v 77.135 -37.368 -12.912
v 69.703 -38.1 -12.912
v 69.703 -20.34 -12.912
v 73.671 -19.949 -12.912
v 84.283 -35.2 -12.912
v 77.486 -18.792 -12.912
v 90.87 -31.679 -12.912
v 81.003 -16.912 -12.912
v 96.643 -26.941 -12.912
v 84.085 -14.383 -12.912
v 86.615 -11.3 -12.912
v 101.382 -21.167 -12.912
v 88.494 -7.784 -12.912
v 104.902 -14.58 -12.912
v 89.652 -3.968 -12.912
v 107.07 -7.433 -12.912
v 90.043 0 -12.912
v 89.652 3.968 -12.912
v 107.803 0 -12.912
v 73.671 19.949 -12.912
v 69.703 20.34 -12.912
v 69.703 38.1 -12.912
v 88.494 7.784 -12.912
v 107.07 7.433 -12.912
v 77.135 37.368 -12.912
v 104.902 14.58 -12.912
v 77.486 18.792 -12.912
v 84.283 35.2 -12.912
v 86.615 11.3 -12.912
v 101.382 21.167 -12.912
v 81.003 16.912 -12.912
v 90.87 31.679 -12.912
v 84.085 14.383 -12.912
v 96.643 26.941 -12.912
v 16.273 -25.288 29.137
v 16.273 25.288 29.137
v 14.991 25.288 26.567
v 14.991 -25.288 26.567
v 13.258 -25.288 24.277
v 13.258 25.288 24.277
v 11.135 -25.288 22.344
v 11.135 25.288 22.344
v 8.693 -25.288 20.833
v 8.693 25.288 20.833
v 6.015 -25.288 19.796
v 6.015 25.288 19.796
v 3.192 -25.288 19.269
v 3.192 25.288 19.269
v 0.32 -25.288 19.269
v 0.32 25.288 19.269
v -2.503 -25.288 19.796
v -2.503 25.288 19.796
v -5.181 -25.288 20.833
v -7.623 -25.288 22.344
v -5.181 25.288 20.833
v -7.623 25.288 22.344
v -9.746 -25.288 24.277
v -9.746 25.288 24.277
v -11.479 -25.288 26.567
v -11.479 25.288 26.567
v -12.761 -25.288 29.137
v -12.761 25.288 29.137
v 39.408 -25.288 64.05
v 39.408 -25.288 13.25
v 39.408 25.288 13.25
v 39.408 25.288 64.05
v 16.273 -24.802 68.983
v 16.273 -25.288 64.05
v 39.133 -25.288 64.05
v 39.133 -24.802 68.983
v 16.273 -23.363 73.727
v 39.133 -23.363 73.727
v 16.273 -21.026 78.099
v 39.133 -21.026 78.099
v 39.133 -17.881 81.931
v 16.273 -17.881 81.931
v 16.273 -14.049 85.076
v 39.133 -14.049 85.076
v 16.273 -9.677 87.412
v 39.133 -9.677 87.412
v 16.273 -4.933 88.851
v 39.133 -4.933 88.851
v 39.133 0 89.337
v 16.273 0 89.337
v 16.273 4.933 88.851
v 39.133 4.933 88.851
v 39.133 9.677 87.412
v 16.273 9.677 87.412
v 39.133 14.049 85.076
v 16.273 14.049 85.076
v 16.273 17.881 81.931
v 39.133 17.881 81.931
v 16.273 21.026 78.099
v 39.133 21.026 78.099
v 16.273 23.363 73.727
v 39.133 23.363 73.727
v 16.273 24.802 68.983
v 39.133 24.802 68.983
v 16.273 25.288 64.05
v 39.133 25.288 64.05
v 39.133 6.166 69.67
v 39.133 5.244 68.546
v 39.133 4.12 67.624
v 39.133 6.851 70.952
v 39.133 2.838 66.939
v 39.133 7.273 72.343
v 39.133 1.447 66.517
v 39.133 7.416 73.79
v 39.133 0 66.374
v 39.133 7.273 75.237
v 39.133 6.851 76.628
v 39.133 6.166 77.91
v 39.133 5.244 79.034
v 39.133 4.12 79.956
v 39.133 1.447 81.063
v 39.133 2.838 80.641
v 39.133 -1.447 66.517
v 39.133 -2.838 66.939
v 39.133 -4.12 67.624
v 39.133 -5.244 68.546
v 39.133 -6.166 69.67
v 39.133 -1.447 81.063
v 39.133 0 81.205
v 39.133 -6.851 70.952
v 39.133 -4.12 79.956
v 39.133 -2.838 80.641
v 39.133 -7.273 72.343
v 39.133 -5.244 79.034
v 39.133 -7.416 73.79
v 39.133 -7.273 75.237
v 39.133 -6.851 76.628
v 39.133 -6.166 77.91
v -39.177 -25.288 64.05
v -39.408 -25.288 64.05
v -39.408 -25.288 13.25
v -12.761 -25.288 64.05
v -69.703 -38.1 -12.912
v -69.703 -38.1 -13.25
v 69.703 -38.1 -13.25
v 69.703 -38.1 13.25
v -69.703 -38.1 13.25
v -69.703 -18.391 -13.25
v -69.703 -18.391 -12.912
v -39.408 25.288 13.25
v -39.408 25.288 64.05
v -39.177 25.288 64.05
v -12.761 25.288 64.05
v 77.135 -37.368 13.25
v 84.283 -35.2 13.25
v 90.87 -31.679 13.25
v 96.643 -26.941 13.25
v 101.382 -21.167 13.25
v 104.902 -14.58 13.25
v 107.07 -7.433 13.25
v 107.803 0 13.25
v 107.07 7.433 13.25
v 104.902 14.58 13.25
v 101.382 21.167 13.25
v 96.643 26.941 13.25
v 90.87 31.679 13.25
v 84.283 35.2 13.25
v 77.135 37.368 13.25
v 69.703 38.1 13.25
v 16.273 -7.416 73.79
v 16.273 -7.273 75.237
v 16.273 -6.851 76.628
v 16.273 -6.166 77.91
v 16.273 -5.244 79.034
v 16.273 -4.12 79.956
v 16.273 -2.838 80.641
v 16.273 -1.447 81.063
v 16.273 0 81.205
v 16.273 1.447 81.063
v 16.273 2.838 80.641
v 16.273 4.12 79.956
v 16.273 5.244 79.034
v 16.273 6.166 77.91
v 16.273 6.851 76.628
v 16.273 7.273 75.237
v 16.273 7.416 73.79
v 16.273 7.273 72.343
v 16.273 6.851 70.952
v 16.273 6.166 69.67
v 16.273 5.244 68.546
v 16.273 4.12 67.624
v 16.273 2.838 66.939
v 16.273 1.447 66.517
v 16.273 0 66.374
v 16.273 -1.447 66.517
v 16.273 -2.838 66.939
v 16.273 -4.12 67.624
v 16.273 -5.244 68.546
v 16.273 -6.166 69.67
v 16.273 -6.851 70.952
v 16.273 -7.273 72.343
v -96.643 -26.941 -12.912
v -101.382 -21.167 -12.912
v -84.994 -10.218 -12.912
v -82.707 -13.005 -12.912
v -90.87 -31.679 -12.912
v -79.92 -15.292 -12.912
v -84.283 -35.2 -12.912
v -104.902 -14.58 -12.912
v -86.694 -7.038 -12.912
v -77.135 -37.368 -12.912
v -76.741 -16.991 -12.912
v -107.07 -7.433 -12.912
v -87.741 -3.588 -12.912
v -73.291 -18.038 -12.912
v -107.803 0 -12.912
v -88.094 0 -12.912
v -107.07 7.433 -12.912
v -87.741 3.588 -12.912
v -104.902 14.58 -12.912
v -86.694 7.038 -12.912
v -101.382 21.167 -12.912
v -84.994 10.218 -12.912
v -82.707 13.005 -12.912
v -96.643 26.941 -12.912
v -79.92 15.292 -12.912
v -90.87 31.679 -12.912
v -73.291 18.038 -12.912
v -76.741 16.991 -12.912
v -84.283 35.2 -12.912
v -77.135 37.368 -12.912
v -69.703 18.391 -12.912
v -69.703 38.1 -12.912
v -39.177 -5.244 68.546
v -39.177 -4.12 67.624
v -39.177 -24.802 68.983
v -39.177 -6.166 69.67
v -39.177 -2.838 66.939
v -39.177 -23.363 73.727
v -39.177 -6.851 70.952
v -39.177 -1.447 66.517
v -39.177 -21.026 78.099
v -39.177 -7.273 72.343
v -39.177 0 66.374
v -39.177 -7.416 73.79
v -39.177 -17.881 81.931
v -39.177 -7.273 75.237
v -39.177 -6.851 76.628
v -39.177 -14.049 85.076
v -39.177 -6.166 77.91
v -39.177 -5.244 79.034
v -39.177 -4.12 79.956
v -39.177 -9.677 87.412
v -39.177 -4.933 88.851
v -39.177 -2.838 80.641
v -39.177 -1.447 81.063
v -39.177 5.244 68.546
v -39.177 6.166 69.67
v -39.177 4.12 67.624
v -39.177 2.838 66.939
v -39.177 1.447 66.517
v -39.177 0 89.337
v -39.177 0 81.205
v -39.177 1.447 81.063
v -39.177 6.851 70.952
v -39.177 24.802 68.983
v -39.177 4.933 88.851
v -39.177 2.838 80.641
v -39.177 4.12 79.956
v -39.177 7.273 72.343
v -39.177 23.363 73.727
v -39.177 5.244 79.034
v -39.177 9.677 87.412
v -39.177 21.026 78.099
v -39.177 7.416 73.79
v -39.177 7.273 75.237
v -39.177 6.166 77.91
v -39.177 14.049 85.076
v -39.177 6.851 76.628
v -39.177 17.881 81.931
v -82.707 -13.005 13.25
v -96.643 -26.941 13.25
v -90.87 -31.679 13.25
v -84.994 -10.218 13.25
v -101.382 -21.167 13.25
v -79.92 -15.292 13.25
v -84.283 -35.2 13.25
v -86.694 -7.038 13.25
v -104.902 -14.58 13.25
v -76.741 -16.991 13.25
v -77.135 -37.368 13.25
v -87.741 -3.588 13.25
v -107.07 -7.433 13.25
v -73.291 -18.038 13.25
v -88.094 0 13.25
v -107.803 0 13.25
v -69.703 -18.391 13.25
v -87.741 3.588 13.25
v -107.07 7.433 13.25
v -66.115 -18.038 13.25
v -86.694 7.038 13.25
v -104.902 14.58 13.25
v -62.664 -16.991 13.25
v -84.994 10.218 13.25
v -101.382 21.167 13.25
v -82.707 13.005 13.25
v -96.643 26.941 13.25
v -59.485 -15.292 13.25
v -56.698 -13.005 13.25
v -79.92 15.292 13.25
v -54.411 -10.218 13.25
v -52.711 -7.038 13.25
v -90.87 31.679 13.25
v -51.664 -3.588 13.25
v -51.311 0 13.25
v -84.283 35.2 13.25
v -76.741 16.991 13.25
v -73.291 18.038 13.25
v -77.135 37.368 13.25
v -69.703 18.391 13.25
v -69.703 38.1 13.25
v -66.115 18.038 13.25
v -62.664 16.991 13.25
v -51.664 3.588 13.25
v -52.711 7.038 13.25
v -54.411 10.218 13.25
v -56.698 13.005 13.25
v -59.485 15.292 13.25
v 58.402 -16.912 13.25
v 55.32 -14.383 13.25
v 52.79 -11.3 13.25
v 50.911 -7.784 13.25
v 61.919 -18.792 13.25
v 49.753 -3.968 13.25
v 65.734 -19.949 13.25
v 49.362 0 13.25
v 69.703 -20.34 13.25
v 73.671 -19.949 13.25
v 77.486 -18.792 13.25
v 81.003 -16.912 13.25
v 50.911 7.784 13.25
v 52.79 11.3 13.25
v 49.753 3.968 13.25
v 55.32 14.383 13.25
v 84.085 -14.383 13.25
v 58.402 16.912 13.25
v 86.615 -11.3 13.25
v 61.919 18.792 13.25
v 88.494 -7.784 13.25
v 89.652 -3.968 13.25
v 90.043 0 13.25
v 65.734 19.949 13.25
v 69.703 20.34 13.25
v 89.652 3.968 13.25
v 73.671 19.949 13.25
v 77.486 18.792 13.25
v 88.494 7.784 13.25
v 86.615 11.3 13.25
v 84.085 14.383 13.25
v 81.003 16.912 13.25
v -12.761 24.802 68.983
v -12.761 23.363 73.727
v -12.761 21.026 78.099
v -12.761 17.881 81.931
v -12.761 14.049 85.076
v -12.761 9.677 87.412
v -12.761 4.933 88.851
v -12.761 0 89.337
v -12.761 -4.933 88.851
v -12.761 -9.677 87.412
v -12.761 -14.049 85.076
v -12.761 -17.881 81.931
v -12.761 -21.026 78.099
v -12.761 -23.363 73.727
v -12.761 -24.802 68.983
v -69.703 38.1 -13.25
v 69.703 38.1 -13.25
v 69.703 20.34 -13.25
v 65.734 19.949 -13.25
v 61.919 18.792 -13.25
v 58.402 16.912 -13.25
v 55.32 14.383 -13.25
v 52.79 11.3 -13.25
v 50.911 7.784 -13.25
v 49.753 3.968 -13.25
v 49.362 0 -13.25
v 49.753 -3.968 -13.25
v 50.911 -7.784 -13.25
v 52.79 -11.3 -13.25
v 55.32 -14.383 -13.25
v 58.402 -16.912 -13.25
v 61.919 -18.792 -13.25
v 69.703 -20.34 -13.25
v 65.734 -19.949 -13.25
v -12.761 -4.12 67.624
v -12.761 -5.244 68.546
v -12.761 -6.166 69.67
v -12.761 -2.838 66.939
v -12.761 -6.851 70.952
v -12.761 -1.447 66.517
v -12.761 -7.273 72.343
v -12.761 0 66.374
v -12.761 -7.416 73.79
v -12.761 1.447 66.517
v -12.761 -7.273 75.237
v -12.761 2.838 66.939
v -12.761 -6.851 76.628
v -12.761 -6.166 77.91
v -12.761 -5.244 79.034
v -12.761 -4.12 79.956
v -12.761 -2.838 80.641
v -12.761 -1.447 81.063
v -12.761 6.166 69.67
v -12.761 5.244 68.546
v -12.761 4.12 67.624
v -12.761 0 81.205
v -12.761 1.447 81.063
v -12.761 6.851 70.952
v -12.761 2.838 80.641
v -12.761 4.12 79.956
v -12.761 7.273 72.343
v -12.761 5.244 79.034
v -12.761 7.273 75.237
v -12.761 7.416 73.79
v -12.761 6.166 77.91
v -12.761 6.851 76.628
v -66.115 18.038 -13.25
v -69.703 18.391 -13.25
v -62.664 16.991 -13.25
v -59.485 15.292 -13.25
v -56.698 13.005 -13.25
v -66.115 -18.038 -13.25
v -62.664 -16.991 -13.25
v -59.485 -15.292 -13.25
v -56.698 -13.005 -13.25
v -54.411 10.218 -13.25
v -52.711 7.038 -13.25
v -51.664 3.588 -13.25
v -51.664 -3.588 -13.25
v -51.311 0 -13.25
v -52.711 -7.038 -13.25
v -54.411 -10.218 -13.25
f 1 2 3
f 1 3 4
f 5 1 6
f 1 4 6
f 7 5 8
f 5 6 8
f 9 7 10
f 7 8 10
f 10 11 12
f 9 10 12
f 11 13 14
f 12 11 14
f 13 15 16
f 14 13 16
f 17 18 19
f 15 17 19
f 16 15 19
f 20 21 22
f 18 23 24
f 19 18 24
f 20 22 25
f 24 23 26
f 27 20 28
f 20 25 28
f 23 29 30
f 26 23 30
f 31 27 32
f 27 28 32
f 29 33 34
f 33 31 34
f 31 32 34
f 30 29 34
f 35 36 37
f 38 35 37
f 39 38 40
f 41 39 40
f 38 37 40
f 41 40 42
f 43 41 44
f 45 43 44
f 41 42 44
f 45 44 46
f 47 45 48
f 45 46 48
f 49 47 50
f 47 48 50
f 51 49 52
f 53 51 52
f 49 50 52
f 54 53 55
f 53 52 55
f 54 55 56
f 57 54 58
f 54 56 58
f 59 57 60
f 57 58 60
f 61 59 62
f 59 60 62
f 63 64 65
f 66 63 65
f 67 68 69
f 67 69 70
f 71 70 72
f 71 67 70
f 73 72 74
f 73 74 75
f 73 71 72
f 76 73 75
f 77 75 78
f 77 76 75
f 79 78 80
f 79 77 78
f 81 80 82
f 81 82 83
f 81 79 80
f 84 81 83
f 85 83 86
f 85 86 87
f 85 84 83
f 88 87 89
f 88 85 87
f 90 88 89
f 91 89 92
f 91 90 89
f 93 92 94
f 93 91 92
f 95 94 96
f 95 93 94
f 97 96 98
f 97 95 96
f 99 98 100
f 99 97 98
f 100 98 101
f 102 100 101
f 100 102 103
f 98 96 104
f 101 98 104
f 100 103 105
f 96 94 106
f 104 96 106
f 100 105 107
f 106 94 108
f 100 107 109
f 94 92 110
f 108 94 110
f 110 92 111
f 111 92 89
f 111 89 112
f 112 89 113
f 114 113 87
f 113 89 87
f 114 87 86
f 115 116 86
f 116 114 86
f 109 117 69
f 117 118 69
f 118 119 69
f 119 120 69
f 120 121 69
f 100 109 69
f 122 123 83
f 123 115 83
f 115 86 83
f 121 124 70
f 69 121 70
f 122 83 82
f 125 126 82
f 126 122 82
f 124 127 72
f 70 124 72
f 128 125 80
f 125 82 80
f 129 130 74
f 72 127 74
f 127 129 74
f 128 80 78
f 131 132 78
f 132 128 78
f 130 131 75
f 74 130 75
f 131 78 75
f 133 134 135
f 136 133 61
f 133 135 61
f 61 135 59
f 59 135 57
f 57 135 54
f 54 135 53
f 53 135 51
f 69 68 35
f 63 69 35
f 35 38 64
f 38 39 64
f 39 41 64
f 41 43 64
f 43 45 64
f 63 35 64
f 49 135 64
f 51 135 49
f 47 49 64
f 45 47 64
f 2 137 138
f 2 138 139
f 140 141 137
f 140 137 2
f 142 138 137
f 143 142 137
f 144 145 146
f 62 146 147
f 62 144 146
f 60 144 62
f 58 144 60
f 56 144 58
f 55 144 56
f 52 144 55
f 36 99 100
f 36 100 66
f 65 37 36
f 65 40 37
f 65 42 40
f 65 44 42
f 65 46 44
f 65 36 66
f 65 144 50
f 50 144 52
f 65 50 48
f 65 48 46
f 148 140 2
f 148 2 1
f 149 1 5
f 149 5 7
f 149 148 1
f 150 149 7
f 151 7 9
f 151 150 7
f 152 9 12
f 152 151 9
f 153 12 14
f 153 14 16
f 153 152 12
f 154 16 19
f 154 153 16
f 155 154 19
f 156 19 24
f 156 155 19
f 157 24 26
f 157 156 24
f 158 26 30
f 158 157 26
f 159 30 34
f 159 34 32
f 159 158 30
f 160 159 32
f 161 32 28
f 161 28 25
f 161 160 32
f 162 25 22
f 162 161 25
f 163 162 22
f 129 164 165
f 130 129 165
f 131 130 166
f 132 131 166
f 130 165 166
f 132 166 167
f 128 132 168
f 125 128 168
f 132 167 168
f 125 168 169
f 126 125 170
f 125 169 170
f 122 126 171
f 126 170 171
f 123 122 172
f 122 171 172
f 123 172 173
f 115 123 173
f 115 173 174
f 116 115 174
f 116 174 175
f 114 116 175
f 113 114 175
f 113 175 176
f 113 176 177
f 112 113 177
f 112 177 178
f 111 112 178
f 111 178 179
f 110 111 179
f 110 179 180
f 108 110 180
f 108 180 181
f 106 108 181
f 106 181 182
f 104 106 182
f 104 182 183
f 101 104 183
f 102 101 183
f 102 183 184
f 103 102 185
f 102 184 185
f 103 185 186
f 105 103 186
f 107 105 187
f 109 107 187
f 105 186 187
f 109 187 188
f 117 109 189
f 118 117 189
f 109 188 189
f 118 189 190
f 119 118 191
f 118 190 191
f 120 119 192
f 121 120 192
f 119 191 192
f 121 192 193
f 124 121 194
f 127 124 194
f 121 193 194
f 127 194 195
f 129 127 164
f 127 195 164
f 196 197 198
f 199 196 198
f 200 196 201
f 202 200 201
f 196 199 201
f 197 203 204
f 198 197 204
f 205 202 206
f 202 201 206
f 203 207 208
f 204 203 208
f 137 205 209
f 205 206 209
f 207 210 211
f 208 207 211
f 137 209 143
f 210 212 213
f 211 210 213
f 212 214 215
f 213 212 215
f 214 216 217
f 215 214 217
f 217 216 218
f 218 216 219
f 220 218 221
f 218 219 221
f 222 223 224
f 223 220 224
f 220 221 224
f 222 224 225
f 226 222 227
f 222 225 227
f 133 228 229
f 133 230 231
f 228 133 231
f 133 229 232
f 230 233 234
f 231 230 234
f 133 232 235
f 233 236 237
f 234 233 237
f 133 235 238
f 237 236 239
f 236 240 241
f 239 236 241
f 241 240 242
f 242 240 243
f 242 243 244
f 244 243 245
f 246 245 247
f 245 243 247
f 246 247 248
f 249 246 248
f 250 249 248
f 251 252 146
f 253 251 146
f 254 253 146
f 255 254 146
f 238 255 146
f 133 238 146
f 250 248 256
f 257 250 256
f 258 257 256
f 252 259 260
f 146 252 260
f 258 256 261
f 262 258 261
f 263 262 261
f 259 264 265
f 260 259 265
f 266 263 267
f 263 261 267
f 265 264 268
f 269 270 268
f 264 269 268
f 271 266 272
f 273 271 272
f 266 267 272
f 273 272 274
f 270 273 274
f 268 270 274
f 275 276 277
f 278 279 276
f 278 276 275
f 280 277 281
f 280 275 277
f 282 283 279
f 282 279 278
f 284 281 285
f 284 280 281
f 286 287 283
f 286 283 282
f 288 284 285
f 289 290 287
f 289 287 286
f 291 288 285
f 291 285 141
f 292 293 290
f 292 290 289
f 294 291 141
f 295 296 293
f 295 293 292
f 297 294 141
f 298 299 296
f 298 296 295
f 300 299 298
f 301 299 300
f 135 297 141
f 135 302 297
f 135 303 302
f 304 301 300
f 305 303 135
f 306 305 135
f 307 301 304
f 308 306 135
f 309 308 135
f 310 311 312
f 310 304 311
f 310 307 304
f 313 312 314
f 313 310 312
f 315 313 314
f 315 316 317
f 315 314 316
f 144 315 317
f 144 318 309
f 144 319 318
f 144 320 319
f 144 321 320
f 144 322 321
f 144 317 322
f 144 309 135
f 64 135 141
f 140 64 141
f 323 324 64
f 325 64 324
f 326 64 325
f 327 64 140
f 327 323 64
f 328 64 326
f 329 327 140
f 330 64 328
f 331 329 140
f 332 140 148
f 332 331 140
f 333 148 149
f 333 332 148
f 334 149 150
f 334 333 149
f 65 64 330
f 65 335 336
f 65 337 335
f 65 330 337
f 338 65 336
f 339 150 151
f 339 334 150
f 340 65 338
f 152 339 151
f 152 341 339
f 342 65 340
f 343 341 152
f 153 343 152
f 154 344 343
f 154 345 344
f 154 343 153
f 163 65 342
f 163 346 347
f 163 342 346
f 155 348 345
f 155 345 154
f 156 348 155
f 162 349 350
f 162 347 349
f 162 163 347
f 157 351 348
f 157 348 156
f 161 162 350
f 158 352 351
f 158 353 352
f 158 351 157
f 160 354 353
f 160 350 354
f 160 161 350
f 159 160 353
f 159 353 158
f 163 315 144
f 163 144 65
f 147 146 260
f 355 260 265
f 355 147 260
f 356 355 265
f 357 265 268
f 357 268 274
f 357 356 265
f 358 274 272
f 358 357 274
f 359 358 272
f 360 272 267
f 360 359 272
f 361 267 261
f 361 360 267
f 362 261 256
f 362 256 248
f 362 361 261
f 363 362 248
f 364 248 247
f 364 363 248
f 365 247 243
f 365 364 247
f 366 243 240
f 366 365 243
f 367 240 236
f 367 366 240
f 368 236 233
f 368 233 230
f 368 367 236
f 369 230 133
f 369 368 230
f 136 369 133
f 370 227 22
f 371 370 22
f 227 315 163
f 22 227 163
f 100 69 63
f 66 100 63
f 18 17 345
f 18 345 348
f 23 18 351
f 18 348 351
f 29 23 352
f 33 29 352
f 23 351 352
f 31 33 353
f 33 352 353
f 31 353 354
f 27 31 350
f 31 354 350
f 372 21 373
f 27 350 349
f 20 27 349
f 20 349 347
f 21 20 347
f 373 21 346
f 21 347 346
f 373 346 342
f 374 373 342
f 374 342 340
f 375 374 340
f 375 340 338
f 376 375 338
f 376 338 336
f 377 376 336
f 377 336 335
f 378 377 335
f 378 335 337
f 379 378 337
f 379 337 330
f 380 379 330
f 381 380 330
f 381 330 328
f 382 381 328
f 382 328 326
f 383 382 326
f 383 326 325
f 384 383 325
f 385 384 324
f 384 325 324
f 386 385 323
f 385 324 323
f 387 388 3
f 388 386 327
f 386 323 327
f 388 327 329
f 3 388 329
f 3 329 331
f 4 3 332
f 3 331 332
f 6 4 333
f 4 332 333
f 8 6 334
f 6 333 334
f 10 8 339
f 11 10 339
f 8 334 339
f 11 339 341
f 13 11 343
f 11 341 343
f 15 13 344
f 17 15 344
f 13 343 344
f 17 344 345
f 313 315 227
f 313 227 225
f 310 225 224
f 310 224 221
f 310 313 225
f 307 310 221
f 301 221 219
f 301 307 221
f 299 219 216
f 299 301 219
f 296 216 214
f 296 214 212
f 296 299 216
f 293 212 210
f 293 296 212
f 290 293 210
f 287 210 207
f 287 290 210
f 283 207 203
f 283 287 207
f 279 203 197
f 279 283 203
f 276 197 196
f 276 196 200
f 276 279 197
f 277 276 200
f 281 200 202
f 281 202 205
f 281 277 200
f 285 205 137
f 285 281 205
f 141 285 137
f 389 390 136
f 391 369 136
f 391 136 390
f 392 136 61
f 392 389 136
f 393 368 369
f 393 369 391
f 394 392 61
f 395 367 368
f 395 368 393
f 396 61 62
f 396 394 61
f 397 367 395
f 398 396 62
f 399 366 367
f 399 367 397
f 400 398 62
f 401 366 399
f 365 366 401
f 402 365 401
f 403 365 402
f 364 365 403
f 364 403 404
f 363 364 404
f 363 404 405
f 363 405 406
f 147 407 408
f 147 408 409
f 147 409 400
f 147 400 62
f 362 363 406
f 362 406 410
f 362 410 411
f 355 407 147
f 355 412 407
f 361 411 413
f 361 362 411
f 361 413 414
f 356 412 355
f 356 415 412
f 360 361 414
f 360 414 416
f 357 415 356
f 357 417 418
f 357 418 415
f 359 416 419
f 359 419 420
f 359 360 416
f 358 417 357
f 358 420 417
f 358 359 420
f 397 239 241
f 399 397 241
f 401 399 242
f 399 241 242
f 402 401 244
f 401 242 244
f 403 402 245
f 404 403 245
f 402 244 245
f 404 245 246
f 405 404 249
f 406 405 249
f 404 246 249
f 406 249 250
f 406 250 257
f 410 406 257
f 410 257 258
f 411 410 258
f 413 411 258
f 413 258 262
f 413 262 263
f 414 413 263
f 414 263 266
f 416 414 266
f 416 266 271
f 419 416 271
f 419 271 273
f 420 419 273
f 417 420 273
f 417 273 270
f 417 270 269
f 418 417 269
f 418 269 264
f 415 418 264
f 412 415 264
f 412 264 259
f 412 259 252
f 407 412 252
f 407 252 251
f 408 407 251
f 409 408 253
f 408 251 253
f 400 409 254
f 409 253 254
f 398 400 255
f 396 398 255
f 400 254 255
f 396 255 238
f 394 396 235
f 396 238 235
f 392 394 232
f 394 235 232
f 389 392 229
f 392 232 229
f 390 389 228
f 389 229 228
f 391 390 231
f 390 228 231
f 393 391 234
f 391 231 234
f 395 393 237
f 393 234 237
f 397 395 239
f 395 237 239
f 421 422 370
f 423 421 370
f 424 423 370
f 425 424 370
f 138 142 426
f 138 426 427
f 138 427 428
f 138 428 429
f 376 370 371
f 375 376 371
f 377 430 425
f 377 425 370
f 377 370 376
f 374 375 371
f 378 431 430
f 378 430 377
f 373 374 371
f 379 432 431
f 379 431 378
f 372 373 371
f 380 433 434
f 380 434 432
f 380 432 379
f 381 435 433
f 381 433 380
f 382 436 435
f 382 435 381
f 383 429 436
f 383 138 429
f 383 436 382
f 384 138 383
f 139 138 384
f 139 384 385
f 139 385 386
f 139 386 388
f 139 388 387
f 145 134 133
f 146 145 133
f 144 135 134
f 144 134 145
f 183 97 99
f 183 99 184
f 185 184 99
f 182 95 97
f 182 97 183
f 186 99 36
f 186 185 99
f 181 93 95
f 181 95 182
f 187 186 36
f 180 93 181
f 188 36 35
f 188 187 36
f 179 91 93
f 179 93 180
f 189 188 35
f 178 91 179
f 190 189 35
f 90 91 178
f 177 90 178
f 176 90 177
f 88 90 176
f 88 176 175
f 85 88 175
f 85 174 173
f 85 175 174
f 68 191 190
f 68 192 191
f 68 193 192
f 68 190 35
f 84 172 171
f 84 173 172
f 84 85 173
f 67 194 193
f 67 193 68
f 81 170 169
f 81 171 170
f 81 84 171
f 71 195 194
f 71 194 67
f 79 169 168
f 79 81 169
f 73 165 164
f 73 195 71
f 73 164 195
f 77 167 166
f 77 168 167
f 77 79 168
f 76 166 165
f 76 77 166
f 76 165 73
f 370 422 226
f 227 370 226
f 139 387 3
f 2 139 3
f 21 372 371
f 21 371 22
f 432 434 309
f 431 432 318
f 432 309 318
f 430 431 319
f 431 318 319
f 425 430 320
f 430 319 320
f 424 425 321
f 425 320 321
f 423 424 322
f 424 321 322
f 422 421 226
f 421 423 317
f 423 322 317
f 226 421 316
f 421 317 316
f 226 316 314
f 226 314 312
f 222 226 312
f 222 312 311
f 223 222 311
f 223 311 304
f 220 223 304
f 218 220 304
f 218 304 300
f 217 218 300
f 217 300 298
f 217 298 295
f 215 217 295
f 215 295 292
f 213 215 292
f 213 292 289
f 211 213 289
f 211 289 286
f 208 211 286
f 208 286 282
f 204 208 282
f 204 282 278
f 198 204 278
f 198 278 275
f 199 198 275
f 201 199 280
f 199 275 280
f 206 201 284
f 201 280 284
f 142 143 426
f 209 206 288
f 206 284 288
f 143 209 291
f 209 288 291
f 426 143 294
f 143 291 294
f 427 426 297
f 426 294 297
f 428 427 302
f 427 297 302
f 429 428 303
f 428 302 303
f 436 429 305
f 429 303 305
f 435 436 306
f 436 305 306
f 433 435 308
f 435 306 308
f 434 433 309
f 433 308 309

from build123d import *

# Parameters (mm, degrees)
F0_W      = 139.4050866365
F0_H      = 26.4991316944
F1_DEPTH  = 38.1
F3_DEPTH  = 26.162
F5_DEPTH  = 26.162
F6_R      = 20.3401801488
F6_R_2    = 18.3914355894
F7_DEPTH  = 26.5001316944
F8_W      = 78.8159519434
F8_H      = 50.5755208433
F9_DEPTH  = 50.8
F11_DEPTH = 63.3887604216
F12_W     = 29.0339104831
F12_H     = 34.9128932312
F13_DEPTH = 63.3887604216
F15_DEPTH = 22.86
F17_DEPTH = 26.416
F18_R     = 7.4156213221
F19_DEPTH = 146.9803799493


with BuildPart() as f1:
    # F0 (on Front) → F1 (new body, symmetric)
    with BuildSketch(Plane.XZ):
        Rectangle(F0_W, F0_H)
    extrude(amount=F1_DEPTH, both=True)

    # F2 (on face) → F3 (join)
    with BuildSketch(Plane.XY.offset(13.2495658472)):
        with BuildLine():
            Line((69.7025433183, 38.1), (69.7025433183, -38.1))
            ThreePointArc((69.7025433183, -38.1), (107.8025433183, 0), (69.7025433183, 38.1))
        make_face()
    extrude(amount=-F3_DEPTH)

    # F4 (on face) → F5 (join)
    with BuildSketch(Plane.XY.offset(13.2495658472)):
        with BuildLine():
            Line((-69.7025433183, -38.1), (-69.7025433183, 38.1))
            ThreePointArc((-69.7025433183, 38.1), (-107.8025433183, 0), (-69.7025433183, -38.1))
        make_face()
    extrude(amount=-F5_DEPTH)

    # F6 (on face) → F7 (cut, through all)
    with BuildSketch(Plane.XY.offset(13.2495658472)):
        with Locations((69.7025433183, 0)):
            Circle(F6_R)
        with Locations((-69.7025433183, 0)):
            Circle(F6_R_2)
    extrude(amount=-F7_DEPTH, mode=Mode.SUBTRACT)

    # F8 (on face) → F9 (join)
    with BuildSketch(Plane.XY.offset(13.2495658472)):
        Rectangle(F8_W, F8_H)
    extrude(amount=F9_DEPTH)

    # F10 (on face) → F11 (cut, through all)
    with BuildSketch(Plane(origin=(0, 25.2877604216, 0), x_dir=(-1, 0, 0), z_dir=(0, 1, 0))):
        with BuildLine():
            Line((12.7608366311, 29.136672616), (-16.2730738521, 29.136672616))
            ThreePointArc((-16.2730738521, 29.136672616), (-1.7561186105, 19.2027423091), (12.7608366311, 29.136672616))
        make_face()
    extrude(amount=-F11_DEPTH, mode=Mode.SUBTRACT)

    # F12 (on face) → F13 (cut, through all)
    with BuildSketch(Plane(origin=(0, 25.2877604216, 0), x_dir=(-1, 0, 0), z_dir=(0, 1, 0))):
        with Locations((-1.7561186105, 46.5931192316)):
            Rectangle(F12_W, F12_H)
    extrude(amount=-F13_DEPTH, mode=Mode.SUBTRACT)

    # F14 (on face) → F15 (join)
    with BuildSketch(Plane(origin=(16.2730738521, 0, 0), x_dir=(0, -1, 0), z_dir=(-1, 0, 0))):
        with BuildLine():
            Line((-25.2877604216, 64.0495658472), (25.2877604216, 64.0495658472))
            ThreePointArc((25.2877604216, 64.0495658472), (0, 89.3373262689), (-25.2877604216, 64.0495658472))
        make_face()
    extrude(amount=-F15_DEPTH)

    # F16 (on face) → F17 (join)
    with BuildSketch(Plane.YZ.offset(-12.7608366311)):
        with BuildLine():
            Line((-25.2877604216, 64.0495658472), (25.2877604216, 64.0495658472))
            ThreePointArc((25.2877604216, 64.0495658472), (0, 89.3373262689), (-25.2877604216, 64.0495658472))
        make_face()
    extrude(amount=-F17_DEPTH)

    # F18 (on face) → F19 (cut, through all)
    with BuildSketch(Plane(origin=(-39.1768366311, 0, 0), x_dir=(0, -1, 0), z_dir=(-1, 0, 0))):
        with Locations((0, 73.7898647785)):
            Circle(F18_R)
    extrude(amount=-F19_DEPTH, mode=Mode.SUBTRACT)


solid = f1.part
